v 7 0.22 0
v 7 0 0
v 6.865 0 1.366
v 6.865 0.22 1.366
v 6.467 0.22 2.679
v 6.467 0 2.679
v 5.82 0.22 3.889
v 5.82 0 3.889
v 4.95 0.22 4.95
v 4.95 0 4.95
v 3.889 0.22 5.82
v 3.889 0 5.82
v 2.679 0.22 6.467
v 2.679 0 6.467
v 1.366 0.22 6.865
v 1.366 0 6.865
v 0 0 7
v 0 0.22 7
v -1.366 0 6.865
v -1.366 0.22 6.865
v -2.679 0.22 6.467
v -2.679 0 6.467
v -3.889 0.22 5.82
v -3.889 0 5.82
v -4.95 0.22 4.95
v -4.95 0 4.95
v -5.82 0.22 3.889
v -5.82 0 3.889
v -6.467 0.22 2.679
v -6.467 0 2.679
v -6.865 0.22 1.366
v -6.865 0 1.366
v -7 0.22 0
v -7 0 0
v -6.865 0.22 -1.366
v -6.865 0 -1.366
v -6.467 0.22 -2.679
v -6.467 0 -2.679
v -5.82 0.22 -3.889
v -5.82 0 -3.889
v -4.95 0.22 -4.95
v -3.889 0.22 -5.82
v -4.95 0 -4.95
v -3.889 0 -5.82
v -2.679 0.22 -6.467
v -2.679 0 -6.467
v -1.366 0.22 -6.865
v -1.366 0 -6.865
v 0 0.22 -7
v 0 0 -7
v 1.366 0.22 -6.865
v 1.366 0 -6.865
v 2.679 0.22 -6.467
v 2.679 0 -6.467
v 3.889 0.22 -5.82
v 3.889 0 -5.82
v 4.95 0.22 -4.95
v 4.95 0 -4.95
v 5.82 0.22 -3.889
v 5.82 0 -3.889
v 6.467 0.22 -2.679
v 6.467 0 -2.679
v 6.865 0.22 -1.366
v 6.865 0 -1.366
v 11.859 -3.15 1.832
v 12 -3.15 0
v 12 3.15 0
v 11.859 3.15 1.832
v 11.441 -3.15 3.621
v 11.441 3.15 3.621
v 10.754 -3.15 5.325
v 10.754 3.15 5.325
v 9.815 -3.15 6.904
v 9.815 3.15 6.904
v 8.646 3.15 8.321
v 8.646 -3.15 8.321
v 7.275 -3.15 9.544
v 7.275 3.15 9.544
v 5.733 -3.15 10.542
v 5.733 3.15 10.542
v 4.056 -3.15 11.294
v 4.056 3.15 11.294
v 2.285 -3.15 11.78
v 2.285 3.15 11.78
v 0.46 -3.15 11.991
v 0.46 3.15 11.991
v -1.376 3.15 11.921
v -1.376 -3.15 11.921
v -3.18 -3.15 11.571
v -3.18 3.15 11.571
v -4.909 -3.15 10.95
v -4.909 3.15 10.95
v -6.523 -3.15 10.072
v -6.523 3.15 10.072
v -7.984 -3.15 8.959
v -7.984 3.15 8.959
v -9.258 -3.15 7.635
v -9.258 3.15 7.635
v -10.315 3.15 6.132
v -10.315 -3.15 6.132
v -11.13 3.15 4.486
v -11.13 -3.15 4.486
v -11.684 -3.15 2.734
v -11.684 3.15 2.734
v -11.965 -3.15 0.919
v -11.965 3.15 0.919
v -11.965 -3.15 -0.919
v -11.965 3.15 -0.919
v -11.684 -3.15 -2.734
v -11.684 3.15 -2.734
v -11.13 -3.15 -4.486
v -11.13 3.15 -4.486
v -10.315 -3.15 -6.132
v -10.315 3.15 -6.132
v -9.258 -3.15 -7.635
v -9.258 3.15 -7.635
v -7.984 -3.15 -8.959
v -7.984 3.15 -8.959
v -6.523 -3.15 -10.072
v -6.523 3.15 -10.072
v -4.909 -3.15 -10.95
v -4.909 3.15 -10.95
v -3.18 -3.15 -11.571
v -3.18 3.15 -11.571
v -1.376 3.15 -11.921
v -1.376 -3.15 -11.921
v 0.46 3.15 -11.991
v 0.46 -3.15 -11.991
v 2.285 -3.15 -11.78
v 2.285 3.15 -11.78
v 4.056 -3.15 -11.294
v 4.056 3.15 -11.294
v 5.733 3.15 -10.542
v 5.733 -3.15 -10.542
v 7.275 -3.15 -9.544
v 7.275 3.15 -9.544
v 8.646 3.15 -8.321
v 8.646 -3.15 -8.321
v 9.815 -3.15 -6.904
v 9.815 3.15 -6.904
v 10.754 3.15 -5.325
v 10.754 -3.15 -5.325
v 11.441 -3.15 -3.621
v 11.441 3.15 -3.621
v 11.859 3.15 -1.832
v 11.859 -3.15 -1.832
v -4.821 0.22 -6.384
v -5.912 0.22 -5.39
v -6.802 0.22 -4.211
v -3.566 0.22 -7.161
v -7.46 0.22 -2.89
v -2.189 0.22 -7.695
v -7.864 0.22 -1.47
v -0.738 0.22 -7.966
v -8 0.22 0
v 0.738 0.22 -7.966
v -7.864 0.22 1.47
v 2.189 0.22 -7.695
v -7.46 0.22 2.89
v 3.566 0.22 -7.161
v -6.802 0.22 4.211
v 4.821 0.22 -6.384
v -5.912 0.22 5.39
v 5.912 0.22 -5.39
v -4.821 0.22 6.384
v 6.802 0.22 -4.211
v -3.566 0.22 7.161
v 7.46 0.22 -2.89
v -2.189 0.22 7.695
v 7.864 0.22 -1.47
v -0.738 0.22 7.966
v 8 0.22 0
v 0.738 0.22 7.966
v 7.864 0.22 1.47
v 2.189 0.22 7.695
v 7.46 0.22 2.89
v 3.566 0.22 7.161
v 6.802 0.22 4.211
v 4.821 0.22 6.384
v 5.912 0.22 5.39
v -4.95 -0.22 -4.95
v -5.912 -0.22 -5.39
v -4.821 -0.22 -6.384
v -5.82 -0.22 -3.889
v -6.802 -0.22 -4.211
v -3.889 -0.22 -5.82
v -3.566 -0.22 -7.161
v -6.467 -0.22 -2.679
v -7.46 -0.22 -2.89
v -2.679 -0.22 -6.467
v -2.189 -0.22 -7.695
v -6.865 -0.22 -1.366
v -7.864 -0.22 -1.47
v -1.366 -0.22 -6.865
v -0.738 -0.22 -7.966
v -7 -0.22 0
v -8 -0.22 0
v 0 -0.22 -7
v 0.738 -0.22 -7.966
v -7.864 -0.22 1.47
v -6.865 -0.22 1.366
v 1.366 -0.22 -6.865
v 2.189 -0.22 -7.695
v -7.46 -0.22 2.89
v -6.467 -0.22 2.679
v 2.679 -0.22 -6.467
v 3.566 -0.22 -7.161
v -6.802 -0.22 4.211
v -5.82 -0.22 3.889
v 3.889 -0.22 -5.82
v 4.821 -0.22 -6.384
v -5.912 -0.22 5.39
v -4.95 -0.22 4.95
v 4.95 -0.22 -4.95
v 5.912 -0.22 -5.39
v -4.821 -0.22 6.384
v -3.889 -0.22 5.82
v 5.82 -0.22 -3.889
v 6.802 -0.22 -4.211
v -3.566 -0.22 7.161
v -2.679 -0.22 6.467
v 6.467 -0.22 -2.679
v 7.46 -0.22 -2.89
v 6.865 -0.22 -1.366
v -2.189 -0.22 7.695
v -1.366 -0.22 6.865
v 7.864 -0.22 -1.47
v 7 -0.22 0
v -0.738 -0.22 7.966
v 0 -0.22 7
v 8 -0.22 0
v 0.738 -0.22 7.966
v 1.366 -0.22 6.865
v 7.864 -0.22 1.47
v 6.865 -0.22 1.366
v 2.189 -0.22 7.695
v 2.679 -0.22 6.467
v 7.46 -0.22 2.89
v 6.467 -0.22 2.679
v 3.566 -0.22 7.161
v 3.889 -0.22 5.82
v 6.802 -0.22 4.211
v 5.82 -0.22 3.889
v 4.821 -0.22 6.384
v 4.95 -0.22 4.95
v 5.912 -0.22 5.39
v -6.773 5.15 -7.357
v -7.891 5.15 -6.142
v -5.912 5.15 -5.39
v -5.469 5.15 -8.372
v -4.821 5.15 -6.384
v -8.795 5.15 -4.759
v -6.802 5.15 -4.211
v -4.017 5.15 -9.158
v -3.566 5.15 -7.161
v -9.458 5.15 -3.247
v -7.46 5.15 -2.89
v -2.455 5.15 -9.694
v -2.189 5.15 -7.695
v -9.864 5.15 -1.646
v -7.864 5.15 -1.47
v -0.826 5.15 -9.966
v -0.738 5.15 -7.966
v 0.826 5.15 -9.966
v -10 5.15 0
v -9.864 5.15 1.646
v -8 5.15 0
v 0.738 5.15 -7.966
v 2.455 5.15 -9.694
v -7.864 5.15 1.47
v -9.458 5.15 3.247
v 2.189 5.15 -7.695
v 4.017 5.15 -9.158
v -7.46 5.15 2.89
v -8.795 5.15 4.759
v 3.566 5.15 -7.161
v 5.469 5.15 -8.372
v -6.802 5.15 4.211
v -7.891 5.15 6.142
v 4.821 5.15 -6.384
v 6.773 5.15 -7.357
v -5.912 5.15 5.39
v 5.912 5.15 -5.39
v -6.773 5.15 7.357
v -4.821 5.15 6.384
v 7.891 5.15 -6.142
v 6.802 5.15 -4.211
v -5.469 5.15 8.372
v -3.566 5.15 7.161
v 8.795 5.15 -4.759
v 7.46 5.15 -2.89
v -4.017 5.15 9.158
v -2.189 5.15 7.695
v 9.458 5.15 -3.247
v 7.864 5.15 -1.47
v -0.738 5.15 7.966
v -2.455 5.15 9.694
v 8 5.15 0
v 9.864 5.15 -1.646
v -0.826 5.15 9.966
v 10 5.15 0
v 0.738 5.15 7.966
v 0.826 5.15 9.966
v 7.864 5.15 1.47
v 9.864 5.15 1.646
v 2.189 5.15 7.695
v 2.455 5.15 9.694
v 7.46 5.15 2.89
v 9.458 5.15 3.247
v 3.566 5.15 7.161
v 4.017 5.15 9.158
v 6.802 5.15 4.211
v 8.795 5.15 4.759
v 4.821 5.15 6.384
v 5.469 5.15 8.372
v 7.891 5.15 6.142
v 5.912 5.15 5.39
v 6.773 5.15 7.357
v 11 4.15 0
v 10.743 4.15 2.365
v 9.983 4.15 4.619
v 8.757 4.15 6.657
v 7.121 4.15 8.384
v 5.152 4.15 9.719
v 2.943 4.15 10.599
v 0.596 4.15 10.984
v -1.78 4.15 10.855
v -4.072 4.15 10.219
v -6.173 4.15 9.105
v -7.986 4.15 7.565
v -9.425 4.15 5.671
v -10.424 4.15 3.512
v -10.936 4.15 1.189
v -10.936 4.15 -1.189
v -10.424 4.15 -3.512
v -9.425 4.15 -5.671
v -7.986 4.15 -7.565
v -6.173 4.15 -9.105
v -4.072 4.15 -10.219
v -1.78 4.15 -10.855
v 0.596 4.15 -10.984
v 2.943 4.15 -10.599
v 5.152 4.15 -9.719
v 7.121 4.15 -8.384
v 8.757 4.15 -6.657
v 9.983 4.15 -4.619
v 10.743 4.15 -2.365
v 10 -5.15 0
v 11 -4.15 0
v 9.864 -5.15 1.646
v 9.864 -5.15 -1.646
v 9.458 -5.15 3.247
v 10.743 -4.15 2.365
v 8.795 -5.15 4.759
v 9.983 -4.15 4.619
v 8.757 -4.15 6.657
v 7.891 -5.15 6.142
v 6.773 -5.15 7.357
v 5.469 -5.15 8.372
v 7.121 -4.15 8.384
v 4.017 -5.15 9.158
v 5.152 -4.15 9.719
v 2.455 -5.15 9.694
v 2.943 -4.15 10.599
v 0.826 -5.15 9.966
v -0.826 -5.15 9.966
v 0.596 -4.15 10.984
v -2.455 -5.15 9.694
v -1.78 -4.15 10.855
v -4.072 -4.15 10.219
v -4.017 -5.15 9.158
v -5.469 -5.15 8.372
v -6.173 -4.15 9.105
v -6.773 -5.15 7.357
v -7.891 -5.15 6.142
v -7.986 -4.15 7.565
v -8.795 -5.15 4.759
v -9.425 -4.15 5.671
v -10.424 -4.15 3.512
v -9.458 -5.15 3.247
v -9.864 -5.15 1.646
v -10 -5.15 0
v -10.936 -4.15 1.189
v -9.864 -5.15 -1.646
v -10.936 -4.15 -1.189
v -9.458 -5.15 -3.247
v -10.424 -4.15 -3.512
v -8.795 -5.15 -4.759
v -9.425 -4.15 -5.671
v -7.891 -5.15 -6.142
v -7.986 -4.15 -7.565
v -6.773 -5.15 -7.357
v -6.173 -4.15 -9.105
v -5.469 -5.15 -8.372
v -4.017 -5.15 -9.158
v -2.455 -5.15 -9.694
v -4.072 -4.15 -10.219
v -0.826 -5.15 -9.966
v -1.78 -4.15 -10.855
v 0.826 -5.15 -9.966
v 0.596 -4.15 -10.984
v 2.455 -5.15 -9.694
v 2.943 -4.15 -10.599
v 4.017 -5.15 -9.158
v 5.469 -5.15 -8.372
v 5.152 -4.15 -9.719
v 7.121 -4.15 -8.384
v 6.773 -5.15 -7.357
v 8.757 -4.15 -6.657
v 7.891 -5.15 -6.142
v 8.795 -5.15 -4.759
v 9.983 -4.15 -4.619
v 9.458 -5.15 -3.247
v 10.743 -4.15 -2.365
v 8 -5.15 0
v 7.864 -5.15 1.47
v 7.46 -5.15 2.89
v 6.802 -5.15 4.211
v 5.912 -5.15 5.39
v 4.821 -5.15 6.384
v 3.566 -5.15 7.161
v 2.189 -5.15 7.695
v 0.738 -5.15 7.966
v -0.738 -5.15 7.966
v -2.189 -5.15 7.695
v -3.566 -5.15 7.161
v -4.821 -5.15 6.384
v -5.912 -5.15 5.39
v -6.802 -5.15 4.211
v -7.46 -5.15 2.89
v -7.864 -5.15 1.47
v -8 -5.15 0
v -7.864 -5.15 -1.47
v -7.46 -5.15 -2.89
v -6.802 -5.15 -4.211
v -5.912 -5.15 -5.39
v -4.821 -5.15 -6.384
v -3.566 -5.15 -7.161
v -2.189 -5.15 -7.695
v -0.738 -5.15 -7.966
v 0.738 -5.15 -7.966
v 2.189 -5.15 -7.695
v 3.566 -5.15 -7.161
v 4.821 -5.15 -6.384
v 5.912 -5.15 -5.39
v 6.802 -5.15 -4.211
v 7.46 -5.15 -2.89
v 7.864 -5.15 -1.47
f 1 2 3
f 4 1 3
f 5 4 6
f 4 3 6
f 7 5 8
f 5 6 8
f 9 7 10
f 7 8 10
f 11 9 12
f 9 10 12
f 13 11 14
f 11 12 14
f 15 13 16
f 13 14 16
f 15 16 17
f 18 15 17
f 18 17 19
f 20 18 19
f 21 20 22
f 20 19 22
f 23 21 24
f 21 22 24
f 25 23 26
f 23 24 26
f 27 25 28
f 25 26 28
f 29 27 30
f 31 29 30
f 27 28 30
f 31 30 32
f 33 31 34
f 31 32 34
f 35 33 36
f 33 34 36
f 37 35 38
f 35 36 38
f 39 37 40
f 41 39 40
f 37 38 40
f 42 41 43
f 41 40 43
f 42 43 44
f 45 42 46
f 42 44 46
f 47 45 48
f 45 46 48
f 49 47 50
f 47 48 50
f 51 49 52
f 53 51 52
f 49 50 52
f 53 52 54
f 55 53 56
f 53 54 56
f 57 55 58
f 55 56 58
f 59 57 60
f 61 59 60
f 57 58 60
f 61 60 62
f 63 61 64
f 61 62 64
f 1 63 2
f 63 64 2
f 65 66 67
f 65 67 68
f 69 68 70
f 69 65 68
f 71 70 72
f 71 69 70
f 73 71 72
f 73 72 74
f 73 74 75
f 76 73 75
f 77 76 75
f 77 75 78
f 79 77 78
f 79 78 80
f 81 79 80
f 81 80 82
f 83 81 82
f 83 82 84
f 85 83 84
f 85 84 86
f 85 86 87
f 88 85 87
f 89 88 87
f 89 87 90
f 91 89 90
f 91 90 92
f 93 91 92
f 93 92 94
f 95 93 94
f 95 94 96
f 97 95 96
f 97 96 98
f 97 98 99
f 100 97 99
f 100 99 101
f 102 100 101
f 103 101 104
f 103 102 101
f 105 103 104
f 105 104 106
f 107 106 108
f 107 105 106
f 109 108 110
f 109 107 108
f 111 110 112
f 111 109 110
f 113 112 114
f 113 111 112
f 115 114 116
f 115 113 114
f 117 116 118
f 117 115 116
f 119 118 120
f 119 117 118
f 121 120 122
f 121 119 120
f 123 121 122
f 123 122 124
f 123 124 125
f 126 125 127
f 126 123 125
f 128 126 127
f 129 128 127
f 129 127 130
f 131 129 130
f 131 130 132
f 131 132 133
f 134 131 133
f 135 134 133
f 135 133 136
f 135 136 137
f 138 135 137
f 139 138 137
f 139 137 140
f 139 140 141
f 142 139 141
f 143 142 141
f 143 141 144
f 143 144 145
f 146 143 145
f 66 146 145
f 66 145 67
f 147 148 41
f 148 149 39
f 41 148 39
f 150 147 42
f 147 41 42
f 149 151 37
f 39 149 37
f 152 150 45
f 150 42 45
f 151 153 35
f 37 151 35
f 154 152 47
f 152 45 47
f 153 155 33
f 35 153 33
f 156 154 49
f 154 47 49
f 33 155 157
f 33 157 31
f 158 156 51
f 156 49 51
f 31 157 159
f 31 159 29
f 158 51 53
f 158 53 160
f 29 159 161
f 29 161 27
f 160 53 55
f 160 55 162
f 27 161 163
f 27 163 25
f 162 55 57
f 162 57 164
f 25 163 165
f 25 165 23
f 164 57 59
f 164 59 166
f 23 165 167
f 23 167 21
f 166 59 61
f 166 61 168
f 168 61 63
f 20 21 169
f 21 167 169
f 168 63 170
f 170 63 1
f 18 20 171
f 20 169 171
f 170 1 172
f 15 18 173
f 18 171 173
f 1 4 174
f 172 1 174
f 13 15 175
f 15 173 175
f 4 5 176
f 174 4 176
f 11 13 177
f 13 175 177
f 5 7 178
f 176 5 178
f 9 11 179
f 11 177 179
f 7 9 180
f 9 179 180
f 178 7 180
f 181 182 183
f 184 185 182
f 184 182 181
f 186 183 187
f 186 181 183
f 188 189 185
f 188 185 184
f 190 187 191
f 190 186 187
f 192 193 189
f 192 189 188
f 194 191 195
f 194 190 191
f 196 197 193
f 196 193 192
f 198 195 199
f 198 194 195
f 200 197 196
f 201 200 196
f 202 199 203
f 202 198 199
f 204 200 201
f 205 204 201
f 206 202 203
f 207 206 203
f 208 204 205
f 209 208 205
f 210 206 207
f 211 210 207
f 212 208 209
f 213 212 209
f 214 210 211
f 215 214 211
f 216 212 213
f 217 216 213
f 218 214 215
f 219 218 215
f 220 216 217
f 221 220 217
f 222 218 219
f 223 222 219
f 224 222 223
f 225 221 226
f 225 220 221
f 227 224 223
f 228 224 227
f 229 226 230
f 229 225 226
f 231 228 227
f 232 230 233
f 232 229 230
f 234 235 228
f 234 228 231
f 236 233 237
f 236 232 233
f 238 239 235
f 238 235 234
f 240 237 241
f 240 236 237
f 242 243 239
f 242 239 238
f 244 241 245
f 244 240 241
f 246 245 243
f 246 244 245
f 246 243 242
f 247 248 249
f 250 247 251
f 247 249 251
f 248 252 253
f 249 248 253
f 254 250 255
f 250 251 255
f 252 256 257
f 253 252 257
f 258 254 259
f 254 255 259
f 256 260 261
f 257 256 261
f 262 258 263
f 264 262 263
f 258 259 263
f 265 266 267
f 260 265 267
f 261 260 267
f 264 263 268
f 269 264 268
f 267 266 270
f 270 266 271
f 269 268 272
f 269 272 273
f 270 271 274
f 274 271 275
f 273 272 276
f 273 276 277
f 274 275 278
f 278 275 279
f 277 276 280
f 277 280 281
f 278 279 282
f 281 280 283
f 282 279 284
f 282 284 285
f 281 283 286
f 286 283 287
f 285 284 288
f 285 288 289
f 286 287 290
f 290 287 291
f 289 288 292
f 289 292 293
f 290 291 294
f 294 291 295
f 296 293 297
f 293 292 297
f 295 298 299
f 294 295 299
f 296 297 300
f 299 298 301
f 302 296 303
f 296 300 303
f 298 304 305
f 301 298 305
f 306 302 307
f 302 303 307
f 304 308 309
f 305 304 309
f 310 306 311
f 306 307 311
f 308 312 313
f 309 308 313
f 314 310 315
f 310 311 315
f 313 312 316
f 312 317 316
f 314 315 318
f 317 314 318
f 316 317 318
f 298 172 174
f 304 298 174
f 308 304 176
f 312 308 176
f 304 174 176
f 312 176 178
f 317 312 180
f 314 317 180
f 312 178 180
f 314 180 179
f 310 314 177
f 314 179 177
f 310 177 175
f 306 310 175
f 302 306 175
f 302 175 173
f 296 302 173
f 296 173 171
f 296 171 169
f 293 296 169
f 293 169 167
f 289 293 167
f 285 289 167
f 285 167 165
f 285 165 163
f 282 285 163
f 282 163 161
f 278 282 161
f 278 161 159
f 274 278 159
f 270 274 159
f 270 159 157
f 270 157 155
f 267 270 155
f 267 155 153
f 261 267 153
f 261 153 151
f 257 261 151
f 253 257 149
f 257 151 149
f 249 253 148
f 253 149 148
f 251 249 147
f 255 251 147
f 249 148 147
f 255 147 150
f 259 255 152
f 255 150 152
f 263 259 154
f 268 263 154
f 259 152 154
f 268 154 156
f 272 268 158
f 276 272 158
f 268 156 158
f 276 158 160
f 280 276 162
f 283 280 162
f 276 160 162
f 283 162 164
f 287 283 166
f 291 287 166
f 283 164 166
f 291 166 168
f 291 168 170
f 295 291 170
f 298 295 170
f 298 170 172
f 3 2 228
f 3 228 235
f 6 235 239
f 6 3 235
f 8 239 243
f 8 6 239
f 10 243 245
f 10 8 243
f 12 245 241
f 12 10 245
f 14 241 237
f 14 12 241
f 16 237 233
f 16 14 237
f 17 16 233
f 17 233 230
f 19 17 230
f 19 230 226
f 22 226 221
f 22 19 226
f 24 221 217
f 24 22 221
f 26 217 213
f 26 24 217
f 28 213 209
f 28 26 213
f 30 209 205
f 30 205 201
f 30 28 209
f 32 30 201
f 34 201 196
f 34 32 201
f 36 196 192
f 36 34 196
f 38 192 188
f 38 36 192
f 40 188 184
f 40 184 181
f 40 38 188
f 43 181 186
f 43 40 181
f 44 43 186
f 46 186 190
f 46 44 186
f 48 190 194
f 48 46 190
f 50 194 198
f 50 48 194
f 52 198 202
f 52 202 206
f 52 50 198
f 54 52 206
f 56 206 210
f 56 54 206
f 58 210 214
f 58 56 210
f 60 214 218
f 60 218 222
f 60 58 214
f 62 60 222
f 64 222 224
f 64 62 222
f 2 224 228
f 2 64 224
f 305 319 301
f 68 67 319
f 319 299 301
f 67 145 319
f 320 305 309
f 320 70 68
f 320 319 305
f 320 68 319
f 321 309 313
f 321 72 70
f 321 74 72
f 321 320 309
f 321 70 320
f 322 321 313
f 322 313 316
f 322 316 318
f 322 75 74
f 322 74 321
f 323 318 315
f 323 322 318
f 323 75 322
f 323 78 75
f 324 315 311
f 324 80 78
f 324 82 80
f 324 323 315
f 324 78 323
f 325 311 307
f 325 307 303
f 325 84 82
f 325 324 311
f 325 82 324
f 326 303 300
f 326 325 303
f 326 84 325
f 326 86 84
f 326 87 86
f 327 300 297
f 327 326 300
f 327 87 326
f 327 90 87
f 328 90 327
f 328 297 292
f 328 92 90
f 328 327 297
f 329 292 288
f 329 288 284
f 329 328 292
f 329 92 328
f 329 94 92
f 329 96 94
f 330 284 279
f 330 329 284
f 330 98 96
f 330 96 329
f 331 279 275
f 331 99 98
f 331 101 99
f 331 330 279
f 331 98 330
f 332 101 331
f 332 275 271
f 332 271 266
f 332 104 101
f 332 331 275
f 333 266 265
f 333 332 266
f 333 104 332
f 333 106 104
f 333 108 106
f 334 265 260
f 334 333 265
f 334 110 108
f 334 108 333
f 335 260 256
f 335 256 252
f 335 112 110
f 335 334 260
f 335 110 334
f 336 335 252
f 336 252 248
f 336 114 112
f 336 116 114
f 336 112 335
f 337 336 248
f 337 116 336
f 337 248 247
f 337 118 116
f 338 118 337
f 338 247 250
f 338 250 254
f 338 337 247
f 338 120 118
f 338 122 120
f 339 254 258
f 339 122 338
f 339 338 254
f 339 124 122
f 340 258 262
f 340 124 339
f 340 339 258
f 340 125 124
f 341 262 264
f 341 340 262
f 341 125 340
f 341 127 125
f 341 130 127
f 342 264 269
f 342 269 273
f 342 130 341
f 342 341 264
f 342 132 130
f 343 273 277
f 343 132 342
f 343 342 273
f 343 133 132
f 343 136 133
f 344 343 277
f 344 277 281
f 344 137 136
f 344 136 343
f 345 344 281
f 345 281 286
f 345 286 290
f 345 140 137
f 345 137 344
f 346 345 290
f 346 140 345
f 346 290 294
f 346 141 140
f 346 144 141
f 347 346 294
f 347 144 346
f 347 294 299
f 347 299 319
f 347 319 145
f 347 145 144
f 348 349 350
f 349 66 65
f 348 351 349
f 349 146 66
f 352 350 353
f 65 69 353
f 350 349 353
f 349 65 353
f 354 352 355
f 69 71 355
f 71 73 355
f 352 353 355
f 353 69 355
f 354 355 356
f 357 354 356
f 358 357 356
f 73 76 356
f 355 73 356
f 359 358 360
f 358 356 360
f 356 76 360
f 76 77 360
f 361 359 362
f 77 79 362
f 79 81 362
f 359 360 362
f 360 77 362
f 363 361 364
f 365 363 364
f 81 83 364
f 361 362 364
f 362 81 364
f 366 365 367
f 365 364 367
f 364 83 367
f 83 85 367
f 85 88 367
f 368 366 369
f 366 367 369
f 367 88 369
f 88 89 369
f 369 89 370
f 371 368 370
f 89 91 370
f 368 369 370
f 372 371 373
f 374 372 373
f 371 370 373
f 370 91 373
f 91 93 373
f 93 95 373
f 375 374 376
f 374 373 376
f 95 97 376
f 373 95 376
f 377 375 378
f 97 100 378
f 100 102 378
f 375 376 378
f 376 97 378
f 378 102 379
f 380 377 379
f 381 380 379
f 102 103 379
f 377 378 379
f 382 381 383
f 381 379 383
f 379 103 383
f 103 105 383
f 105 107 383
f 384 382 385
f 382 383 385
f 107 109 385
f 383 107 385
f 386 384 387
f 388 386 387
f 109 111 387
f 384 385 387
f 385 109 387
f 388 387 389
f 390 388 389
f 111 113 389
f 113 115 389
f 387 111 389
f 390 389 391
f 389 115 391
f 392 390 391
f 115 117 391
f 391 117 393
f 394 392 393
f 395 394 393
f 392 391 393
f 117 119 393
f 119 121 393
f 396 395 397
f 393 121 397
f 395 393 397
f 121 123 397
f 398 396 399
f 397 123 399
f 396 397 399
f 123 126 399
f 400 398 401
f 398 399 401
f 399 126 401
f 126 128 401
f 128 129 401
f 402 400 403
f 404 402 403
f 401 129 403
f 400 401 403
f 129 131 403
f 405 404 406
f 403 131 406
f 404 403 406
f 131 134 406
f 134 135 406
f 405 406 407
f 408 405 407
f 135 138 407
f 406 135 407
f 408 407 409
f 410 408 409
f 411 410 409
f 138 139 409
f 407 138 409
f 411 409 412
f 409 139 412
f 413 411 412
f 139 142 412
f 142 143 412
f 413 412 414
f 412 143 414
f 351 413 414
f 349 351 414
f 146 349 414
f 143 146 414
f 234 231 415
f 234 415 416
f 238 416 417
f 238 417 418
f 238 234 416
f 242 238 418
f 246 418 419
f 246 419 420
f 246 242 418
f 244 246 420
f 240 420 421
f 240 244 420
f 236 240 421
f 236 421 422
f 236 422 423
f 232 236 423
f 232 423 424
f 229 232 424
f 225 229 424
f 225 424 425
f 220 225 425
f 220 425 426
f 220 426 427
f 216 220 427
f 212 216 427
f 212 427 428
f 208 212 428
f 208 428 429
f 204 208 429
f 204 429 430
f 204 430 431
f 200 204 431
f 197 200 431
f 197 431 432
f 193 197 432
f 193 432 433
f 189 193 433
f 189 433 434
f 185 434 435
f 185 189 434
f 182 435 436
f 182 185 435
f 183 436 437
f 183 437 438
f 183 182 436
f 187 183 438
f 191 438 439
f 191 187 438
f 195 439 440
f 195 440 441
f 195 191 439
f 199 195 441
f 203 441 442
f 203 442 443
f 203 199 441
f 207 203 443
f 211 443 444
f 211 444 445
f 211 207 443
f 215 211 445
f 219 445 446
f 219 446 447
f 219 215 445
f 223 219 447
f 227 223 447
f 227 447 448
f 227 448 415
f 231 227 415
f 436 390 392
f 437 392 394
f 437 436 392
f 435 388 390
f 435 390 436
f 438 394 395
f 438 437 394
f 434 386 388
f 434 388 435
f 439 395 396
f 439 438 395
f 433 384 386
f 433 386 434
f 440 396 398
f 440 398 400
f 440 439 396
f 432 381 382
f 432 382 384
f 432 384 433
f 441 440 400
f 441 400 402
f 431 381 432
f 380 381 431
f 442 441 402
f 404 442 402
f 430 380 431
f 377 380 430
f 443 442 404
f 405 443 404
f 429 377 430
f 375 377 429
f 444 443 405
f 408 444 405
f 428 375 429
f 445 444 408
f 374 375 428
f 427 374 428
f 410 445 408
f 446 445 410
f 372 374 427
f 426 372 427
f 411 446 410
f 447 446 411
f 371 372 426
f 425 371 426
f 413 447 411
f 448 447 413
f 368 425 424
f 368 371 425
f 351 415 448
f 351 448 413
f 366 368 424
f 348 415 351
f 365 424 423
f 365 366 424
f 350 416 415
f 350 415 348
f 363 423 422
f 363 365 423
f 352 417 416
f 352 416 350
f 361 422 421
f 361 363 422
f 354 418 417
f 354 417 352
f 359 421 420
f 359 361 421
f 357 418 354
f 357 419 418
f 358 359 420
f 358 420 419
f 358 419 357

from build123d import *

# Parameters (mm, degrees)
F0_R     = 12
F0_R_2   = 8
F1_DEPTH = 5.15
F2_DEPTH = 5.15
F0_R_3   = 7
F3_DEPTH = 0.22
F4_DEPTH = 0.22
F5_SIZE  = 2


with BuildPart() as f1:
    # F0 (on Front) → F1 (new body)
    with BuildSketch(Plane.XZ):
        Circle(F0_R)
        Circle(F0_R_2, mode=Mode.SUBTRACT)
    extrude(amount=F1_DEPTH)

    # F0 (on Front) → F2 (join)
    with BuildSketch(Plane.XZ):
        Circle(F0_R)
        Circle(F0_R_2, mode=Mode.SUBTRACT)
    extrude(amount=-F2_DEPTH)

    # F0 (on Front) → F3 (join)
    with BuildSketch(Plane.XZ):
        Circle(F0_R_2)
        Circle(F0_R_3, mode=Mode.SUBTRACT)
    extrude(amount=F3_DEPTH)

    # F0 (on Front) → F4 (join)
    with BuildSketch(Plane.XZ):
        Circle(F0_R_2)
        Circle(F0_R_3, mode=Mode.SUBTRACT)
    extrude(amount=-F4_DEPTH)

    # F5
    f5_edges = [f1.edges().sort_by_distance(p)[0] for p in [
        (-12, -5.15, 0),
        (-12, 5.15, 0),
    ]]
    chamfer(f5_edges, length=F5_SIZE)


solid = f1.part
